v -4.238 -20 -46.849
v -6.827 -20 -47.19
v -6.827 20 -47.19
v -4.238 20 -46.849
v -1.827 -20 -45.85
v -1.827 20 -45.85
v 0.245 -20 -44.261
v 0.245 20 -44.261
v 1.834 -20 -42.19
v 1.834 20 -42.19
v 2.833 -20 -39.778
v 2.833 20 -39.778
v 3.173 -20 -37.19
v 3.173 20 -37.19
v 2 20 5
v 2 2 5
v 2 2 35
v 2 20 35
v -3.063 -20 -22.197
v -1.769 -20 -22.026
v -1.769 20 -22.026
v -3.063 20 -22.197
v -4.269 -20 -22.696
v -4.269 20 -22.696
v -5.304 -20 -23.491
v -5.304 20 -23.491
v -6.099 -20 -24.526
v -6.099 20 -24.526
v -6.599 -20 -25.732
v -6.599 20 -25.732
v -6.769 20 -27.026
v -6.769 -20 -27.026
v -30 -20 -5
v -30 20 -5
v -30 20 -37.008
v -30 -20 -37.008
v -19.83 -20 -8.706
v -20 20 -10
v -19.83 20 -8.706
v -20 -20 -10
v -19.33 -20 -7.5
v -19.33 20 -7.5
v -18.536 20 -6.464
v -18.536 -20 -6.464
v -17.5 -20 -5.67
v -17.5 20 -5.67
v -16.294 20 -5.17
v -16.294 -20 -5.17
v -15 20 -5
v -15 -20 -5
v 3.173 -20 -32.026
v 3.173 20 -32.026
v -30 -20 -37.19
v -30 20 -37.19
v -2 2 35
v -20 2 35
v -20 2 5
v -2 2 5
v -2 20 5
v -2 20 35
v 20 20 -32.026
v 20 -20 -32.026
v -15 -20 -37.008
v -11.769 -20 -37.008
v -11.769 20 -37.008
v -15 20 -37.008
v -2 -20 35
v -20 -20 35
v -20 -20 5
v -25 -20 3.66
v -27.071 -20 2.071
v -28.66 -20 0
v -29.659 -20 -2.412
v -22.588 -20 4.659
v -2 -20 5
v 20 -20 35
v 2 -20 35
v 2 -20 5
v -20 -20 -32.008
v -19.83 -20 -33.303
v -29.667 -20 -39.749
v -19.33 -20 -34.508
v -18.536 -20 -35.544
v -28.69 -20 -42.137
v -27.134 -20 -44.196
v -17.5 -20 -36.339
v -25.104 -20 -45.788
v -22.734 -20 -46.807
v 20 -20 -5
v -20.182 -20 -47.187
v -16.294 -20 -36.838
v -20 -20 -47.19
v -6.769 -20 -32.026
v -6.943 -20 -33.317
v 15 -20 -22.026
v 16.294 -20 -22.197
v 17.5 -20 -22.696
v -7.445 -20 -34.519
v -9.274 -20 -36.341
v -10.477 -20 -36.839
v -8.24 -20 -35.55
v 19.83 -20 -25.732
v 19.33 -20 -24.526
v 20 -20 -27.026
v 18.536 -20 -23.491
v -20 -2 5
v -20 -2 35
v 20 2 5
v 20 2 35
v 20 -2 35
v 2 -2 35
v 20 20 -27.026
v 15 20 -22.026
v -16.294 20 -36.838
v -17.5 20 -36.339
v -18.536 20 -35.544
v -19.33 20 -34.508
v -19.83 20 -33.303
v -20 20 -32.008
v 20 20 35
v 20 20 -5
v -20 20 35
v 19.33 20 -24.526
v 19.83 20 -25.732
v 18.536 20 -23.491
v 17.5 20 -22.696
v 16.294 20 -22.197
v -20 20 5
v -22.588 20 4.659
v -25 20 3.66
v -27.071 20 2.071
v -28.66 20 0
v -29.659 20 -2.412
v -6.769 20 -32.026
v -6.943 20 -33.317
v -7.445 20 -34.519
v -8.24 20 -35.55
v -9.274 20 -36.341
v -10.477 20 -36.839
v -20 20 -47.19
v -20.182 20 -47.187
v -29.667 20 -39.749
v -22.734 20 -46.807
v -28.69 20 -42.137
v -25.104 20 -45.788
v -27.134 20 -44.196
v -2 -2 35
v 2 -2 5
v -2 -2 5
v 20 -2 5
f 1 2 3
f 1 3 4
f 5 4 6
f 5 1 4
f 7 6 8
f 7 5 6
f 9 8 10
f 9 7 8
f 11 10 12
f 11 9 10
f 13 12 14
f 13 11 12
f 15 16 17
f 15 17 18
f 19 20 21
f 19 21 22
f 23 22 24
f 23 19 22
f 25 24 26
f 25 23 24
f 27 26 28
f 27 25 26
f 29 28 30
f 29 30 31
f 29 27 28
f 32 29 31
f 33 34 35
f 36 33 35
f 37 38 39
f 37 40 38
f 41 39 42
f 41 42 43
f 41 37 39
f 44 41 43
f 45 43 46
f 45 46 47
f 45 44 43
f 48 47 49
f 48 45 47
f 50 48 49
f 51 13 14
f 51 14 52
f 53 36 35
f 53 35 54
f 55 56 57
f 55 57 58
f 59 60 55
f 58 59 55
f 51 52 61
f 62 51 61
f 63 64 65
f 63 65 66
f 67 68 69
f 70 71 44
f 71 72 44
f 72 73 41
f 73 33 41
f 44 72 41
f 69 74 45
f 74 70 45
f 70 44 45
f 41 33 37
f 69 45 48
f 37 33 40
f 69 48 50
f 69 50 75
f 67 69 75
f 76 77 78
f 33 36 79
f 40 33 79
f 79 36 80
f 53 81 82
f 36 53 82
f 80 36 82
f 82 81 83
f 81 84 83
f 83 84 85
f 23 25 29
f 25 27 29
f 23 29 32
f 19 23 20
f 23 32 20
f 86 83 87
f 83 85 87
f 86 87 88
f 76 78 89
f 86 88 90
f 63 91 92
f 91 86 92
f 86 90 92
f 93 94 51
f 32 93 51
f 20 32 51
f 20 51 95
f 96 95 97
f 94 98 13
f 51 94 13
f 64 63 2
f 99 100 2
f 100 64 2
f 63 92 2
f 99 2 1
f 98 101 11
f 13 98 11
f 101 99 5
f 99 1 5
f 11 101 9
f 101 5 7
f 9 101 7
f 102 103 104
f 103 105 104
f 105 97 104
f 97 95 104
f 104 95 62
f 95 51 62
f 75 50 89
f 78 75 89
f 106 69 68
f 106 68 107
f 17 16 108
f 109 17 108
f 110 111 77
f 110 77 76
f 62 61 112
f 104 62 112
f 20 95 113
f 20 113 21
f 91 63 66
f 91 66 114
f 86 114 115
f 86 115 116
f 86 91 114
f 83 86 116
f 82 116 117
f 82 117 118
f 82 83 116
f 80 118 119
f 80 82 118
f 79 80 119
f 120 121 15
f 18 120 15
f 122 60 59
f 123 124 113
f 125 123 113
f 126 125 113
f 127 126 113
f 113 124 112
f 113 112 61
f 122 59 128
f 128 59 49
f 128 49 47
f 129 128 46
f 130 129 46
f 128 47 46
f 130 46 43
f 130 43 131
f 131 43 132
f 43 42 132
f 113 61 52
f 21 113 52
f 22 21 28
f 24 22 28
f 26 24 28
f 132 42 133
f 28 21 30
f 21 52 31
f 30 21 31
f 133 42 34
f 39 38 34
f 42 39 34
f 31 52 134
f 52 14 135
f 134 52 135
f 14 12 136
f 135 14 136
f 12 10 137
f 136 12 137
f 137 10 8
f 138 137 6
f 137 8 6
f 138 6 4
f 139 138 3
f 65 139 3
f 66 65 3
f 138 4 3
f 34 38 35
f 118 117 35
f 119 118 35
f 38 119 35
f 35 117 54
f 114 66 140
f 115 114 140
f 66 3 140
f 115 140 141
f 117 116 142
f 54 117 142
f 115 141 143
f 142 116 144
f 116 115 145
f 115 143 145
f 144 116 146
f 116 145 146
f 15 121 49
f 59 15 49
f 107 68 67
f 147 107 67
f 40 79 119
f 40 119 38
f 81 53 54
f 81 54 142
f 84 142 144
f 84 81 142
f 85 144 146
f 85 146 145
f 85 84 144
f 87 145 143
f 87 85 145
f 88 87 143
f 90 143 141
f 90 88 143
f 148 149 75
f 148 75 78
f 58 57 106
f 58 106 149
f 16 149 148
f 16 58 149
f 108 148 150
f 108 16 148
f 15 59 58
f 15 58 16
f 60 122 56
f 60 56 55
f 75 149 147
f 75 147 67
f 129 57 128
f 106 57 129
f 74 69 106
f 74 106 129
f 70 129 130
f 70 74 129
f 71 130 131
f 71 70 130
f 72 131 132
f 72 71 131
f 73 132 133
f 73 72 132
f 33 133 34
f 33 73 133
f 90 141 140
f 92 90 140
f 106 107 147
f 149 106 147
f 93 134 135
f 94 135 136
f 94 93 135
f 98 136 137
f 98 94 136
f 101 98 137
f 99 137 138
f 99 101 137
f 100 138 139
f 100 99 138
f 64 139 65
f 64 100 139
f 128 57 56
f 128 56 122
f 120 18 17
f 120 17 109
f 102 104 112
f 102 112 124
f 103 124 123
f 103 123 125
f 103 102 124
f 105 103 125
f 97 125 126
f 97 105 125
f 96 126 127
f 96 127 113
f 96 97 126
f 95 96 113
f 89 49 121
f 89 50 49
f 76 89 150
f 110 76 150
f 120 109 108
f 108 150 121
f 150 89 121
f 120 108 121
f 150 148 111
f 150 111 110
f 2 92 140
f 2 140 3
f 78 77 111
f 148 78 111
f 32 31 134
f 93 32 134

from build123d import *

# Parameters (mm, degrees)
F1_DEPTH = 20
F2_W     = 10
F2_H     = 40
F3_DEPTH = 30
F4_W     = 2
F4_H     = 18
F4_H_2   = 2
F4_W_2   = 18
F5_DEPTH = 30


# Not quite as in the source:
# - a feature names something its author has since deleted; it is built from what else it names


with BuildPart() as f1:
    # F0 (on Front) → F1 (new body, symmetric)
    with BuildSketch(Plane.XZ):
        with BuildLine():
            Line((-10, -5), (20, -5))
            Line((20, -5), (20, 5))
            Line((20, 5), (-20, 5))
            ThreePointArc((-20, 5), (-27.0710678119, 2.0710678119), (-30, -5))
            Line((-30, -5), (-30, -37.0084848255))
            Line((-30, -37.0084848255), (-29.9999700785, -37.1900333921))
            ThreePointArc((-29.9999700785, -37.1900333921), (-27.134358967, -44.1955599538), (-20.1815186475, -47.1867371371))
            Line((-20.1815186475, -47.1867371371), (-20, -47.1900331229))
            Line((-20, -47.1900331229), (-10, -47.1900331229))
            Line((-10, -47.1900331229), (-6.8265195005, -47.1900331229))
            ThreePointArc((-6.8265195005, -47.1900331229), (0.2445483114, -44.2611009348), (3.1734804995, -37.1900331229))
            Line((3.1734804995, -37.1900331229), (3.1734804995, -32.0262350142))
            Line((3.1734804995, -32.0262350142), (20, -32.0262350142))
            Line((20, -32.0262350142), (20, -27.0262350142))
            ThreePointArc((20, -27.0262350142), (18.5355339059, -23.4907011083), (15, -22.0262350142))
            Line((15, -22.0262350142), (3.1734804995, -22.0262350142))
            Line((3.1734804995, -22.0262350142), (-1.7689520504, -22.0262350142))
            ThreePointArc((-1.7689520504, -22.0262350142), (-5.3044859563, -23.4907011083), (-6.7689520504, -27.0262350142))
            Line((-6.7689520504, -27.0262350142), (-6.7689520504, -32.0262350142))
            ThreePointArc((-6.7689520504, -32.0262350142), (-8.2395588674, -35.5501802143), (-11.7686128262, -37.0084848255))
            Line((-11.7686128262, -37.0084848255), (-15, -37.0084848255))
            ThreePointArc((-15, -37.0084848255), (-18.5355339059, -35.5440187314), (-20, -32.0084848255))
            Line((-20, -32.0084848255), (-20, -15))
            Line((-20, -15), (-20, -10))
            ThreePointArc((-20, -10), (-18.5355339059, -6.4644660941), (-15, -5))
            Line((-15, -5), (-10, -5))
        make_face()
    extrude(amount=F1_DEPTH, both=True)

    # F2 (on face) → F3 (join)
    with BuildSketch(Plane.XY.offset(5)):
        with Locations((5, 0)):
            Rectangle(F2_W, F2_H)
        with Locations((-5, 0)):
            Rectangle(F2_W, F2_H)
        with Locations((-15, 0)):
            Rectangle(F2_W, F2_H)
        with Locations((15, 0)):
            Rectangle(F2_W, F2_H)
    extrude(amount=F3_DEPTH)

    # F4 (on face) → F5 (cut)
    with BuildSketch(Plane.XY.offset(35)):
        with Locations((-1, 11)):
            Rectangle(F4_W, F4_H)
        with Locations((-1, 1)):
            Rectangle(F4_W, F4_H_2)
        with Locations((-1, -1)):
            Rectangle(F4_W, F4_H_2)
        with Locations((-1, -11)):
            Rectangle(F4_W, F4_H)
        with Locations((1, 11)):
            Rectangle(F4_W, F4_H)
        with Locations((1, 1)):
            Rectangle(F4_W, F4_H_2)
        with Locations((1, -1)):
            Rectangle(F4_W, F4_H_2)
        with Locations((1, -11)):
            Rectangle(F4_W, F4_H)
        with Locations((11, 1)):
            Rectangle(F4_W_2, F4_H_2)
        with Locations((11, -1)):
            Rectangle(F4_W_2, F4_H_2)
        with Locations((-11, -1)):
            Rectangle(F4_W_2, F4_H_2)
        with Locations((-11, 1)):
            Rectangle(F4_W_2, F4_H_2)
    extrude(amount=-F5_DEPTH, mode=Mode.SUBTRACT)


solid = f1.part
